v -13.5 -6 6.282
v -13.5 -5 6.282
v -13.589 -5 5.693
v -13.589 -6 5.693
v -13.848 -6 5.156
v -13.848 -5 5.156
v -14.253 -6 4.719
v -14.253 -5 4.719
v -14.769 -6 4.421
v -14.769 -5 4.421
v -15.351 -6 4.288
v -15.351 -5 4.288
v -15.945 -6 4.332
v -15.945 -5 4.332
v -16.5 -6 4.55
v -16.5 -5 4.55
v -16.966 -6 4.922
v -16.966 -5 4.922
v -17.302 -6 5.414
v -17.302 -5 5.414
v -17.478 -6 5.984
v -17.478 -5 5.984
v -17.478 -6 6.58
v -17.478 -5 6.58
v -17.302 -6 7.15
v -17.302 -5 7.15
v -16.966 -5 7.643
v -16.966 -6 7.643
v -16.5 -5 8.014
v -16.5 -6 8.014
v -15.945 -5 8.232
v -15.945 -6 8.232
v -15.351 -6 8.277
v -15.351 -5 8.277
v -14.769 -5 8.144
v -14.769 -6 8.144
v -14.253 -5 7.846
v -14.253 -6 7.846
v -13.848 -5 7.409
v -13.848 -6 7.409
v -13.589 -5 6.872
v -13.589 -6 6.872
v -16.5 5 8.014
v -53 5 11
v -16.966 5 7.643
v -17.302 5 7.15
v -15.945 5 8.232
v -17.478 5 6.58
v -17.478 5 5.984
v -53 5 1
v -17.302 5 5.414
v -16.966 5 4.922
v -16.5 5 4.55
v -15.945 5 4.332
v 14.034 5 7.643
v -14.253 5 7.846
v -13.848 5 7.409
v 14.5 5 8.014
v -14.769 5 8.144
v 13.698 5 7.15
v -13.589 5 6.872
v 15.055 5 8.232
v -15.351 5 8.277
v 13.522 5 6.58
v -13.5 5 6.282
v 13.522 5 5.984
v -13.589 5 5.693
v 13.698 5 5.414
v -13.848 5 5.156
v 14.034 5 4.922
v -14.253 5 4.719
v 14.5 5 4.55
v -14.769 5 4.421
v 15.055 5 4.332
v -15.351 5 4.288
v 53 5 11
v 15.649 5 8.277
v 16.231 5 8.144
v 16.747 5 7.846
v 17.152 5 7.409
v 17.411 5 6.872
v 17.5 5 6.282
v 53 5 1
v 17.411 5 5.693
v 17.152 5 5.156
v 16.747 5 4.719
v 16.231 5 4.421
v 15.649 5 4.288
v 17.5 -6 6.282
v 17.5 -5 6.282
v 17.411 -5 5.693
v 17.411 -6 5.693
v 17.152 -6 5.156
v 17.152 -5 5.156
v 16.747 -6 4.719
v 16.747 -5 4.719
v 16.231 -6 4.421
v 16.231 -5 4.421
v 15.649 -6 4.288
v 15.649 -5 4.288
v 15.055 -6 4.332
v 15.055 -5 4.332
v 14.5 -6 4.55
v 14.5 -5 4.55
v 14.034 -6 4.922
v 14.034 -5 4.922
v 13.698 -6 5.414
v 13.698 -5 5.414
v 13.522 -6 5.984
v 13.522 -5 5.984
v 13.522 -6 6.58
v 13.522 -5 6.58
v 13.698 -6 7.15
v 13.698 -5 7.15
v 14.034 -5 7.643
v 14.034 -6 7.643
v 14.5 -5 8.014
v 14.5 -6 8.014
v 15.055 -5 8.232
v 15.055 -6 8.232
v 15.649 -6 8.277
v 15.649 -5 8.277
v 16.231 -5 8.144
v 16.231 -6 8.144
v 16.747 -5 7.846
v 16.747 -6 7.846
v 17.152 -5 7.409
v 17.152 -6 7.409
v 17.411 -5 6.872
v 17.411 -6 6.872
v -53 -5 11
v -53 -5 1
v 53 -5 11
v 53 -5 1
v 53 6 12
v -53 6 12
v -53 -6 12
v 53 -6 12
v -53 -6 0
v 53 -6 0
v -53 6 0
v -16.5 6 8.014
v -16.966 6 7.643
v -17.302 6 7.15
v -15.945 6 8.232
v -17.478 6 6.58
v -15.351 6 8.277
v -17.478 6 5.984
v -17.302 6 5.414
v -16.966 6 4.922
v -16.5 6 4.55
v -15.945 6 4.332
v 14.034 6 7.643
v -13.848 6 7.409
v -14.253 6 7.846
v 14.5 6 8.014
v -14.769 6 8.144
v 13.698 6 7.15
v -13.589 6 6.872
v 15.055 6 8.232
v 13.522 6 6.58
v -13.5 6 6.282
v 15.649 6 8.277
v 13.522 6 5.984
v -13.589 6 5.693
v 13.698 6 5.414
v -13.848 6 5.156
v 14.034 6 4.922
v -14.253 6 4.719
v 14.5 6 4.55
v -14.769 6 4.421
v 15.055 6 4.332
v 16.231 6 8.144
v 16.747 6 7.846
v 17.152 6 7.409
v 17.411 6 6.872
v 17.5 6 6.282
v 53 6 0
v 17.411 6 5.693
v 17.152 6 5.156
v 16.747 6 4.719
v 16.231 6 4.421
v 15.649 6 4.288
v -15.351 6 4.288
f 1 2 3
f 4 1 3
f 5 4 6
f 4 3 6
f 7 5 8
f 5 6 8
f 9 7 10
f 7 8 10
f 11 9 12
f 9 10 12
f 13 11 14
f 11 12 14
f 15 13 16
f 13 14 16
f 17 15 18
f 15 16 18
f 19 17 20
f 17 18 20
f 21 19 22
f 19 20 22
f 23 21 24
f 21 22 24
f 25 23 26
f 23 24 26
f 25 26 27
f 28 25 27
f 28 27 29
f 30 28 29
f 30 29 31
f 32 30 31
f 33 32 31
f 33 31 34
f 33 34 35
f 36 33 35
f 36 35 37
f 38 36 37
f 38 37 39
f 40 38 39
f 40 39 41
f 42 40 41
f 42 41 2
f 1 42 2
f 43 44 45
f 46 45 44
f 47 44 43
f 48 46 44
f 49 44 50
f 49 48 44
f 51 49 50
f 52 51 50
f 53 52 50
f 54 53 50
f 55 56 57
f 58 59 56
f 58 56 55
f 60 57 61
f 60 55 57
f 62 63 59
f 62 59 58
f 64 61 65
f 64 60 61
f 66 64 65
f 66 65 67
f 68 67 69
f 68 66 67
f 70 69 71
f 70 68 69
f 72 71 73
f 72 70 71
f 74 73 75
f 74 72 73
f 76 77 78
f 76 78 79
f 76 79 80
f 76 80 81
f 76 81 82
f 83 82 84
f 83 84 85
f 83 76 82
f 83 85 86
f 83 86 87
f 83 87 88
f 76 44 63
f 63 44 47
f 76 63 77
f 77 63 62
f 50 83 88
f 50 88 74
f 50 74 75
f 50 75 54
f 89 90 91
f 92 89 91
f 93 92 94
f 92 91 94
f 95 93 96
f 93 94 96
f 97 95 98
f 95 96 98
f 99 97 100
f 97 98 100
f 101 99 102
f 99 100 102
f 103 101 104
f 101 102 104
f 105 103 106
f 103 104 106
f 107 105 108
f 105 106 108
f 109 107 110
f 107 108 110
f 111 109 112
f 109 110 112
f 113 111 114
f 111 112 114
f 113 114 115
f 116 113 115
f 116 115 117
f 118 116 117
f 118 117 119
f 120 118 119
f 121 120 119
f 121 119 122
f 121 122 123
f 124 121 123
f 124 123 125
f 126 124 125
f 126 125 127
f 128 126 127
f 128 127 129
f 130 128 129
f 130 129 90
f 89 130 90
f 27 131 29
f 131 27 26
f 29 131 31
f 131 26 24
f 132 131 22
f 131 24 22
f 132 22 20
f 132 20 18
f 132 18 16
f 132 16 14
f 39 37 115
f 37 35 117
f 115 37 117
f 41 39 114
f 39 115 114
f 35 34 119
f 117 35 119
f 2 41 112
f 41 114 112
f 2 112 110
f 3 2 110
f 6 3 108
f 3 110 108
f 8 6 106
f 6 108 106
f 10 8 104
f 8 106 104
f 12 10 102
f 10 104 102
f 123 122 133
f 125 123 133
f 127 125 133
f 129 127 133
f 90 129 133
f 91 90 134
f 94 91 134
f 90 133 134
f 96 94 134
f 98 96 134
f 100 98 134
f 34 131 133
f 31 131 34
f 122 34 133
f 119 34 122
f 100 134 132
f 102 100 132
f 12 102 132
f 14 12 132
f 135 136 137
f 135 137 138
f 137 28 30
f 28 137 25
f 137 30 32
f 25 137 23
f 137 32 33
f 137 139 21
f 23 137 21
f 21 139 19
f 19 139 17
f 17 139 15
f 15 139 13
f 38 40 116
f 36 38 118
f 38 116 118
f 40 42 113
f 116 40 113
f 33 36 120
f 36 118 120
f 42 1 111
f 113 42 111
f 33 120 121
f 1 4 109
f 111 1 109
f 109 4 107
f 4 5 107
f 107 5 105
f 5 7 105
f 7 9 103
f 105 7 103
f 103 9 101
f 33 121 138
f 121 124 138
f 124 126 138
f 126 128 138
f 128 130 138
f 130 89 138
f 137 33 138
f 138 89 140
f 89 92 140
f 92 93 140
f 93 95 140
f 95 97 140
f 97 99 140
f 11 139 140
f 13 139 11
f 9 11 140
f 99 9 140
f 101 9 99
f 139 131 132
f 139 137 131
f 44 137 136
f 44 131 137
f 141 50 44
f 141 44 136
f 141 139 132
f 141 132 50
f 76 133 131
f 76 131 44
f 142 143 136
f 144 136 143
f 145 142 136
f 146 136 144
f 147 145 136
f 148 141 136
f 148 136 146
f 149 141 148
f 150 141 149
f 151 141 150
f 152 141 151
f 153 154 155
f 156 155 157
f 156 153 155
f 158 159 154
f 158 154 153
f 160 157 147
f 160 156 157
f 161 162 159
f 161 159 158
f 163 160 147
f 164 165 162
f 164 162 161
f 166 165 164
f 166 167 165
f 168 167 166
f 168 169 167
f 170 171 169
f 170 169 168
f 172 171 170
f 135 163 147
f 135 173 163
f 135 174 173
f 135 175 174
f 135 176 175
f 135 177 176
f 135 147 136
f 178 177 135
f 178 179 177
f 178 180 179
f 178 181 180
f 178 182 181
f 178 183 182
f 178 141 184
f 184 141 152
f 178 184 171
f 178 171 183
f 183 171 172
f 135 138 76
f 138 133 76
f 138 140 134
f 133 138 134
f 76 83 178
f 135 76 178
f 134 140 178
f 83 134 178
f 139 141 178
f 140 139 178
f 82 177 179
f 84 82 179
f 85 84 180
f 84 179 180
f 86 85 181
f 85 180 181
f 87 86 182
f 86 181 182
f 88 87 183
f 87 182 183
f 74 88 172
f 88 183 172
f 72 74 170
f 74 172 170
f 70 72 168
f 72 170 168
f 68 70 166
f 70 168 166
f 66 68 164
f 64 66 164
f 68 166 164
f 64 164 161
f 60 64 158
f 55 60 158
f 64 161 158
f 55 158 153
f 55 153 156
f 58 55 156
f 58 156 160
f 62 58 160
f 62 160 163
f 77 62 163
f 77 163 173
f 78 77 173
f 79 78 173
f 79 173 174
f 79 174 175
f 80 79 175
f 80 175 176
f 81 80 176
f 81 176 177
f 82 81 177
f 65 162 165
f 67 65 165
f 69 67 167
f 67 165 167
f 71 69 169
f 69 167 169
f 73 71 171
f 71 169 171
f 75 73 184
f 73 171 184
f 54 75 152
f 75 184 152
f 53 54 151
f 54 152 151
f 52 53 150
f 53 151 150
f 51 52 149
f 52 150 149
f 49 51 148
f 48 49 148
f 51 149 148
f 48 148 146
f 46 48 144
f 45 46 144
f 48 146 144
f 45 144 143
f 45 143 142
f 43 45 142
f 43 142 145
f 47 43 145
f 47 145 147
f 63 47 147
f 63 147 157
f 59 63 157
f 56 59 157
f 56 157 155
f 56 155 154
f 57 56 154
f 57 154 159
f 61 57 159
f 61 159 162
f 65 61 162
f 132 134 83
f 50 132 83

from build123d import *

# Parameters (mm, degrees)
SKETCH1_W           = 106
SKETCH1_H           = 12
BOSS_EXTRUDE1_DEPTH = 12
SKETCH2_R           = 2
CUT_EXTRUDE1_DEPTH  = 12
SKETCH3_W           = 10
SKETCH3_H           = 10
CUT_EXTRUDE2_DEPTH  = 128


with BuildPart() as part:
    # Sketch1 → Boss-Extrude1 (new body)
    with BuildSketch(Plane.XY):
        Rectangle(SKETCH1_W, SKETCH1_H)
    extrude(amount=BOSS_EXTRUDE1_DEPTH)

    # Sketch2 → Cut-Extrude1 (cut)
    with BuildSketch(Plane(origin=(0, 6, 0), x_dir=(1, 0, 0), z_dir=(0, 1, 0))):
        with Locations((-15.5, -6.282258571)):
            Circle(SKETCH2_R)
        with Locations((15.5, -6.282258571)):
            Circle(SKETCH2_R)
    extrude(amount=-CUT_EXTRUDE1_DEPTH, mode=Mode.SUBTRACT)

    # Sketch3 → Cut-Extrude2 (cut)
    with BuildSketch(Plane(origin=(53, 0, 0), x_dir=(0, 0, -1), z_dir=(1, 0, 0))):
        with Locations((-6, 0)):
            Rectangle(SKETCH3_W, SKETCH3_H)
    extrude(amount=-CUT_EXTRUDE2_DEPTH, mode=Mode.SUBTRACT)


solid = part.part
